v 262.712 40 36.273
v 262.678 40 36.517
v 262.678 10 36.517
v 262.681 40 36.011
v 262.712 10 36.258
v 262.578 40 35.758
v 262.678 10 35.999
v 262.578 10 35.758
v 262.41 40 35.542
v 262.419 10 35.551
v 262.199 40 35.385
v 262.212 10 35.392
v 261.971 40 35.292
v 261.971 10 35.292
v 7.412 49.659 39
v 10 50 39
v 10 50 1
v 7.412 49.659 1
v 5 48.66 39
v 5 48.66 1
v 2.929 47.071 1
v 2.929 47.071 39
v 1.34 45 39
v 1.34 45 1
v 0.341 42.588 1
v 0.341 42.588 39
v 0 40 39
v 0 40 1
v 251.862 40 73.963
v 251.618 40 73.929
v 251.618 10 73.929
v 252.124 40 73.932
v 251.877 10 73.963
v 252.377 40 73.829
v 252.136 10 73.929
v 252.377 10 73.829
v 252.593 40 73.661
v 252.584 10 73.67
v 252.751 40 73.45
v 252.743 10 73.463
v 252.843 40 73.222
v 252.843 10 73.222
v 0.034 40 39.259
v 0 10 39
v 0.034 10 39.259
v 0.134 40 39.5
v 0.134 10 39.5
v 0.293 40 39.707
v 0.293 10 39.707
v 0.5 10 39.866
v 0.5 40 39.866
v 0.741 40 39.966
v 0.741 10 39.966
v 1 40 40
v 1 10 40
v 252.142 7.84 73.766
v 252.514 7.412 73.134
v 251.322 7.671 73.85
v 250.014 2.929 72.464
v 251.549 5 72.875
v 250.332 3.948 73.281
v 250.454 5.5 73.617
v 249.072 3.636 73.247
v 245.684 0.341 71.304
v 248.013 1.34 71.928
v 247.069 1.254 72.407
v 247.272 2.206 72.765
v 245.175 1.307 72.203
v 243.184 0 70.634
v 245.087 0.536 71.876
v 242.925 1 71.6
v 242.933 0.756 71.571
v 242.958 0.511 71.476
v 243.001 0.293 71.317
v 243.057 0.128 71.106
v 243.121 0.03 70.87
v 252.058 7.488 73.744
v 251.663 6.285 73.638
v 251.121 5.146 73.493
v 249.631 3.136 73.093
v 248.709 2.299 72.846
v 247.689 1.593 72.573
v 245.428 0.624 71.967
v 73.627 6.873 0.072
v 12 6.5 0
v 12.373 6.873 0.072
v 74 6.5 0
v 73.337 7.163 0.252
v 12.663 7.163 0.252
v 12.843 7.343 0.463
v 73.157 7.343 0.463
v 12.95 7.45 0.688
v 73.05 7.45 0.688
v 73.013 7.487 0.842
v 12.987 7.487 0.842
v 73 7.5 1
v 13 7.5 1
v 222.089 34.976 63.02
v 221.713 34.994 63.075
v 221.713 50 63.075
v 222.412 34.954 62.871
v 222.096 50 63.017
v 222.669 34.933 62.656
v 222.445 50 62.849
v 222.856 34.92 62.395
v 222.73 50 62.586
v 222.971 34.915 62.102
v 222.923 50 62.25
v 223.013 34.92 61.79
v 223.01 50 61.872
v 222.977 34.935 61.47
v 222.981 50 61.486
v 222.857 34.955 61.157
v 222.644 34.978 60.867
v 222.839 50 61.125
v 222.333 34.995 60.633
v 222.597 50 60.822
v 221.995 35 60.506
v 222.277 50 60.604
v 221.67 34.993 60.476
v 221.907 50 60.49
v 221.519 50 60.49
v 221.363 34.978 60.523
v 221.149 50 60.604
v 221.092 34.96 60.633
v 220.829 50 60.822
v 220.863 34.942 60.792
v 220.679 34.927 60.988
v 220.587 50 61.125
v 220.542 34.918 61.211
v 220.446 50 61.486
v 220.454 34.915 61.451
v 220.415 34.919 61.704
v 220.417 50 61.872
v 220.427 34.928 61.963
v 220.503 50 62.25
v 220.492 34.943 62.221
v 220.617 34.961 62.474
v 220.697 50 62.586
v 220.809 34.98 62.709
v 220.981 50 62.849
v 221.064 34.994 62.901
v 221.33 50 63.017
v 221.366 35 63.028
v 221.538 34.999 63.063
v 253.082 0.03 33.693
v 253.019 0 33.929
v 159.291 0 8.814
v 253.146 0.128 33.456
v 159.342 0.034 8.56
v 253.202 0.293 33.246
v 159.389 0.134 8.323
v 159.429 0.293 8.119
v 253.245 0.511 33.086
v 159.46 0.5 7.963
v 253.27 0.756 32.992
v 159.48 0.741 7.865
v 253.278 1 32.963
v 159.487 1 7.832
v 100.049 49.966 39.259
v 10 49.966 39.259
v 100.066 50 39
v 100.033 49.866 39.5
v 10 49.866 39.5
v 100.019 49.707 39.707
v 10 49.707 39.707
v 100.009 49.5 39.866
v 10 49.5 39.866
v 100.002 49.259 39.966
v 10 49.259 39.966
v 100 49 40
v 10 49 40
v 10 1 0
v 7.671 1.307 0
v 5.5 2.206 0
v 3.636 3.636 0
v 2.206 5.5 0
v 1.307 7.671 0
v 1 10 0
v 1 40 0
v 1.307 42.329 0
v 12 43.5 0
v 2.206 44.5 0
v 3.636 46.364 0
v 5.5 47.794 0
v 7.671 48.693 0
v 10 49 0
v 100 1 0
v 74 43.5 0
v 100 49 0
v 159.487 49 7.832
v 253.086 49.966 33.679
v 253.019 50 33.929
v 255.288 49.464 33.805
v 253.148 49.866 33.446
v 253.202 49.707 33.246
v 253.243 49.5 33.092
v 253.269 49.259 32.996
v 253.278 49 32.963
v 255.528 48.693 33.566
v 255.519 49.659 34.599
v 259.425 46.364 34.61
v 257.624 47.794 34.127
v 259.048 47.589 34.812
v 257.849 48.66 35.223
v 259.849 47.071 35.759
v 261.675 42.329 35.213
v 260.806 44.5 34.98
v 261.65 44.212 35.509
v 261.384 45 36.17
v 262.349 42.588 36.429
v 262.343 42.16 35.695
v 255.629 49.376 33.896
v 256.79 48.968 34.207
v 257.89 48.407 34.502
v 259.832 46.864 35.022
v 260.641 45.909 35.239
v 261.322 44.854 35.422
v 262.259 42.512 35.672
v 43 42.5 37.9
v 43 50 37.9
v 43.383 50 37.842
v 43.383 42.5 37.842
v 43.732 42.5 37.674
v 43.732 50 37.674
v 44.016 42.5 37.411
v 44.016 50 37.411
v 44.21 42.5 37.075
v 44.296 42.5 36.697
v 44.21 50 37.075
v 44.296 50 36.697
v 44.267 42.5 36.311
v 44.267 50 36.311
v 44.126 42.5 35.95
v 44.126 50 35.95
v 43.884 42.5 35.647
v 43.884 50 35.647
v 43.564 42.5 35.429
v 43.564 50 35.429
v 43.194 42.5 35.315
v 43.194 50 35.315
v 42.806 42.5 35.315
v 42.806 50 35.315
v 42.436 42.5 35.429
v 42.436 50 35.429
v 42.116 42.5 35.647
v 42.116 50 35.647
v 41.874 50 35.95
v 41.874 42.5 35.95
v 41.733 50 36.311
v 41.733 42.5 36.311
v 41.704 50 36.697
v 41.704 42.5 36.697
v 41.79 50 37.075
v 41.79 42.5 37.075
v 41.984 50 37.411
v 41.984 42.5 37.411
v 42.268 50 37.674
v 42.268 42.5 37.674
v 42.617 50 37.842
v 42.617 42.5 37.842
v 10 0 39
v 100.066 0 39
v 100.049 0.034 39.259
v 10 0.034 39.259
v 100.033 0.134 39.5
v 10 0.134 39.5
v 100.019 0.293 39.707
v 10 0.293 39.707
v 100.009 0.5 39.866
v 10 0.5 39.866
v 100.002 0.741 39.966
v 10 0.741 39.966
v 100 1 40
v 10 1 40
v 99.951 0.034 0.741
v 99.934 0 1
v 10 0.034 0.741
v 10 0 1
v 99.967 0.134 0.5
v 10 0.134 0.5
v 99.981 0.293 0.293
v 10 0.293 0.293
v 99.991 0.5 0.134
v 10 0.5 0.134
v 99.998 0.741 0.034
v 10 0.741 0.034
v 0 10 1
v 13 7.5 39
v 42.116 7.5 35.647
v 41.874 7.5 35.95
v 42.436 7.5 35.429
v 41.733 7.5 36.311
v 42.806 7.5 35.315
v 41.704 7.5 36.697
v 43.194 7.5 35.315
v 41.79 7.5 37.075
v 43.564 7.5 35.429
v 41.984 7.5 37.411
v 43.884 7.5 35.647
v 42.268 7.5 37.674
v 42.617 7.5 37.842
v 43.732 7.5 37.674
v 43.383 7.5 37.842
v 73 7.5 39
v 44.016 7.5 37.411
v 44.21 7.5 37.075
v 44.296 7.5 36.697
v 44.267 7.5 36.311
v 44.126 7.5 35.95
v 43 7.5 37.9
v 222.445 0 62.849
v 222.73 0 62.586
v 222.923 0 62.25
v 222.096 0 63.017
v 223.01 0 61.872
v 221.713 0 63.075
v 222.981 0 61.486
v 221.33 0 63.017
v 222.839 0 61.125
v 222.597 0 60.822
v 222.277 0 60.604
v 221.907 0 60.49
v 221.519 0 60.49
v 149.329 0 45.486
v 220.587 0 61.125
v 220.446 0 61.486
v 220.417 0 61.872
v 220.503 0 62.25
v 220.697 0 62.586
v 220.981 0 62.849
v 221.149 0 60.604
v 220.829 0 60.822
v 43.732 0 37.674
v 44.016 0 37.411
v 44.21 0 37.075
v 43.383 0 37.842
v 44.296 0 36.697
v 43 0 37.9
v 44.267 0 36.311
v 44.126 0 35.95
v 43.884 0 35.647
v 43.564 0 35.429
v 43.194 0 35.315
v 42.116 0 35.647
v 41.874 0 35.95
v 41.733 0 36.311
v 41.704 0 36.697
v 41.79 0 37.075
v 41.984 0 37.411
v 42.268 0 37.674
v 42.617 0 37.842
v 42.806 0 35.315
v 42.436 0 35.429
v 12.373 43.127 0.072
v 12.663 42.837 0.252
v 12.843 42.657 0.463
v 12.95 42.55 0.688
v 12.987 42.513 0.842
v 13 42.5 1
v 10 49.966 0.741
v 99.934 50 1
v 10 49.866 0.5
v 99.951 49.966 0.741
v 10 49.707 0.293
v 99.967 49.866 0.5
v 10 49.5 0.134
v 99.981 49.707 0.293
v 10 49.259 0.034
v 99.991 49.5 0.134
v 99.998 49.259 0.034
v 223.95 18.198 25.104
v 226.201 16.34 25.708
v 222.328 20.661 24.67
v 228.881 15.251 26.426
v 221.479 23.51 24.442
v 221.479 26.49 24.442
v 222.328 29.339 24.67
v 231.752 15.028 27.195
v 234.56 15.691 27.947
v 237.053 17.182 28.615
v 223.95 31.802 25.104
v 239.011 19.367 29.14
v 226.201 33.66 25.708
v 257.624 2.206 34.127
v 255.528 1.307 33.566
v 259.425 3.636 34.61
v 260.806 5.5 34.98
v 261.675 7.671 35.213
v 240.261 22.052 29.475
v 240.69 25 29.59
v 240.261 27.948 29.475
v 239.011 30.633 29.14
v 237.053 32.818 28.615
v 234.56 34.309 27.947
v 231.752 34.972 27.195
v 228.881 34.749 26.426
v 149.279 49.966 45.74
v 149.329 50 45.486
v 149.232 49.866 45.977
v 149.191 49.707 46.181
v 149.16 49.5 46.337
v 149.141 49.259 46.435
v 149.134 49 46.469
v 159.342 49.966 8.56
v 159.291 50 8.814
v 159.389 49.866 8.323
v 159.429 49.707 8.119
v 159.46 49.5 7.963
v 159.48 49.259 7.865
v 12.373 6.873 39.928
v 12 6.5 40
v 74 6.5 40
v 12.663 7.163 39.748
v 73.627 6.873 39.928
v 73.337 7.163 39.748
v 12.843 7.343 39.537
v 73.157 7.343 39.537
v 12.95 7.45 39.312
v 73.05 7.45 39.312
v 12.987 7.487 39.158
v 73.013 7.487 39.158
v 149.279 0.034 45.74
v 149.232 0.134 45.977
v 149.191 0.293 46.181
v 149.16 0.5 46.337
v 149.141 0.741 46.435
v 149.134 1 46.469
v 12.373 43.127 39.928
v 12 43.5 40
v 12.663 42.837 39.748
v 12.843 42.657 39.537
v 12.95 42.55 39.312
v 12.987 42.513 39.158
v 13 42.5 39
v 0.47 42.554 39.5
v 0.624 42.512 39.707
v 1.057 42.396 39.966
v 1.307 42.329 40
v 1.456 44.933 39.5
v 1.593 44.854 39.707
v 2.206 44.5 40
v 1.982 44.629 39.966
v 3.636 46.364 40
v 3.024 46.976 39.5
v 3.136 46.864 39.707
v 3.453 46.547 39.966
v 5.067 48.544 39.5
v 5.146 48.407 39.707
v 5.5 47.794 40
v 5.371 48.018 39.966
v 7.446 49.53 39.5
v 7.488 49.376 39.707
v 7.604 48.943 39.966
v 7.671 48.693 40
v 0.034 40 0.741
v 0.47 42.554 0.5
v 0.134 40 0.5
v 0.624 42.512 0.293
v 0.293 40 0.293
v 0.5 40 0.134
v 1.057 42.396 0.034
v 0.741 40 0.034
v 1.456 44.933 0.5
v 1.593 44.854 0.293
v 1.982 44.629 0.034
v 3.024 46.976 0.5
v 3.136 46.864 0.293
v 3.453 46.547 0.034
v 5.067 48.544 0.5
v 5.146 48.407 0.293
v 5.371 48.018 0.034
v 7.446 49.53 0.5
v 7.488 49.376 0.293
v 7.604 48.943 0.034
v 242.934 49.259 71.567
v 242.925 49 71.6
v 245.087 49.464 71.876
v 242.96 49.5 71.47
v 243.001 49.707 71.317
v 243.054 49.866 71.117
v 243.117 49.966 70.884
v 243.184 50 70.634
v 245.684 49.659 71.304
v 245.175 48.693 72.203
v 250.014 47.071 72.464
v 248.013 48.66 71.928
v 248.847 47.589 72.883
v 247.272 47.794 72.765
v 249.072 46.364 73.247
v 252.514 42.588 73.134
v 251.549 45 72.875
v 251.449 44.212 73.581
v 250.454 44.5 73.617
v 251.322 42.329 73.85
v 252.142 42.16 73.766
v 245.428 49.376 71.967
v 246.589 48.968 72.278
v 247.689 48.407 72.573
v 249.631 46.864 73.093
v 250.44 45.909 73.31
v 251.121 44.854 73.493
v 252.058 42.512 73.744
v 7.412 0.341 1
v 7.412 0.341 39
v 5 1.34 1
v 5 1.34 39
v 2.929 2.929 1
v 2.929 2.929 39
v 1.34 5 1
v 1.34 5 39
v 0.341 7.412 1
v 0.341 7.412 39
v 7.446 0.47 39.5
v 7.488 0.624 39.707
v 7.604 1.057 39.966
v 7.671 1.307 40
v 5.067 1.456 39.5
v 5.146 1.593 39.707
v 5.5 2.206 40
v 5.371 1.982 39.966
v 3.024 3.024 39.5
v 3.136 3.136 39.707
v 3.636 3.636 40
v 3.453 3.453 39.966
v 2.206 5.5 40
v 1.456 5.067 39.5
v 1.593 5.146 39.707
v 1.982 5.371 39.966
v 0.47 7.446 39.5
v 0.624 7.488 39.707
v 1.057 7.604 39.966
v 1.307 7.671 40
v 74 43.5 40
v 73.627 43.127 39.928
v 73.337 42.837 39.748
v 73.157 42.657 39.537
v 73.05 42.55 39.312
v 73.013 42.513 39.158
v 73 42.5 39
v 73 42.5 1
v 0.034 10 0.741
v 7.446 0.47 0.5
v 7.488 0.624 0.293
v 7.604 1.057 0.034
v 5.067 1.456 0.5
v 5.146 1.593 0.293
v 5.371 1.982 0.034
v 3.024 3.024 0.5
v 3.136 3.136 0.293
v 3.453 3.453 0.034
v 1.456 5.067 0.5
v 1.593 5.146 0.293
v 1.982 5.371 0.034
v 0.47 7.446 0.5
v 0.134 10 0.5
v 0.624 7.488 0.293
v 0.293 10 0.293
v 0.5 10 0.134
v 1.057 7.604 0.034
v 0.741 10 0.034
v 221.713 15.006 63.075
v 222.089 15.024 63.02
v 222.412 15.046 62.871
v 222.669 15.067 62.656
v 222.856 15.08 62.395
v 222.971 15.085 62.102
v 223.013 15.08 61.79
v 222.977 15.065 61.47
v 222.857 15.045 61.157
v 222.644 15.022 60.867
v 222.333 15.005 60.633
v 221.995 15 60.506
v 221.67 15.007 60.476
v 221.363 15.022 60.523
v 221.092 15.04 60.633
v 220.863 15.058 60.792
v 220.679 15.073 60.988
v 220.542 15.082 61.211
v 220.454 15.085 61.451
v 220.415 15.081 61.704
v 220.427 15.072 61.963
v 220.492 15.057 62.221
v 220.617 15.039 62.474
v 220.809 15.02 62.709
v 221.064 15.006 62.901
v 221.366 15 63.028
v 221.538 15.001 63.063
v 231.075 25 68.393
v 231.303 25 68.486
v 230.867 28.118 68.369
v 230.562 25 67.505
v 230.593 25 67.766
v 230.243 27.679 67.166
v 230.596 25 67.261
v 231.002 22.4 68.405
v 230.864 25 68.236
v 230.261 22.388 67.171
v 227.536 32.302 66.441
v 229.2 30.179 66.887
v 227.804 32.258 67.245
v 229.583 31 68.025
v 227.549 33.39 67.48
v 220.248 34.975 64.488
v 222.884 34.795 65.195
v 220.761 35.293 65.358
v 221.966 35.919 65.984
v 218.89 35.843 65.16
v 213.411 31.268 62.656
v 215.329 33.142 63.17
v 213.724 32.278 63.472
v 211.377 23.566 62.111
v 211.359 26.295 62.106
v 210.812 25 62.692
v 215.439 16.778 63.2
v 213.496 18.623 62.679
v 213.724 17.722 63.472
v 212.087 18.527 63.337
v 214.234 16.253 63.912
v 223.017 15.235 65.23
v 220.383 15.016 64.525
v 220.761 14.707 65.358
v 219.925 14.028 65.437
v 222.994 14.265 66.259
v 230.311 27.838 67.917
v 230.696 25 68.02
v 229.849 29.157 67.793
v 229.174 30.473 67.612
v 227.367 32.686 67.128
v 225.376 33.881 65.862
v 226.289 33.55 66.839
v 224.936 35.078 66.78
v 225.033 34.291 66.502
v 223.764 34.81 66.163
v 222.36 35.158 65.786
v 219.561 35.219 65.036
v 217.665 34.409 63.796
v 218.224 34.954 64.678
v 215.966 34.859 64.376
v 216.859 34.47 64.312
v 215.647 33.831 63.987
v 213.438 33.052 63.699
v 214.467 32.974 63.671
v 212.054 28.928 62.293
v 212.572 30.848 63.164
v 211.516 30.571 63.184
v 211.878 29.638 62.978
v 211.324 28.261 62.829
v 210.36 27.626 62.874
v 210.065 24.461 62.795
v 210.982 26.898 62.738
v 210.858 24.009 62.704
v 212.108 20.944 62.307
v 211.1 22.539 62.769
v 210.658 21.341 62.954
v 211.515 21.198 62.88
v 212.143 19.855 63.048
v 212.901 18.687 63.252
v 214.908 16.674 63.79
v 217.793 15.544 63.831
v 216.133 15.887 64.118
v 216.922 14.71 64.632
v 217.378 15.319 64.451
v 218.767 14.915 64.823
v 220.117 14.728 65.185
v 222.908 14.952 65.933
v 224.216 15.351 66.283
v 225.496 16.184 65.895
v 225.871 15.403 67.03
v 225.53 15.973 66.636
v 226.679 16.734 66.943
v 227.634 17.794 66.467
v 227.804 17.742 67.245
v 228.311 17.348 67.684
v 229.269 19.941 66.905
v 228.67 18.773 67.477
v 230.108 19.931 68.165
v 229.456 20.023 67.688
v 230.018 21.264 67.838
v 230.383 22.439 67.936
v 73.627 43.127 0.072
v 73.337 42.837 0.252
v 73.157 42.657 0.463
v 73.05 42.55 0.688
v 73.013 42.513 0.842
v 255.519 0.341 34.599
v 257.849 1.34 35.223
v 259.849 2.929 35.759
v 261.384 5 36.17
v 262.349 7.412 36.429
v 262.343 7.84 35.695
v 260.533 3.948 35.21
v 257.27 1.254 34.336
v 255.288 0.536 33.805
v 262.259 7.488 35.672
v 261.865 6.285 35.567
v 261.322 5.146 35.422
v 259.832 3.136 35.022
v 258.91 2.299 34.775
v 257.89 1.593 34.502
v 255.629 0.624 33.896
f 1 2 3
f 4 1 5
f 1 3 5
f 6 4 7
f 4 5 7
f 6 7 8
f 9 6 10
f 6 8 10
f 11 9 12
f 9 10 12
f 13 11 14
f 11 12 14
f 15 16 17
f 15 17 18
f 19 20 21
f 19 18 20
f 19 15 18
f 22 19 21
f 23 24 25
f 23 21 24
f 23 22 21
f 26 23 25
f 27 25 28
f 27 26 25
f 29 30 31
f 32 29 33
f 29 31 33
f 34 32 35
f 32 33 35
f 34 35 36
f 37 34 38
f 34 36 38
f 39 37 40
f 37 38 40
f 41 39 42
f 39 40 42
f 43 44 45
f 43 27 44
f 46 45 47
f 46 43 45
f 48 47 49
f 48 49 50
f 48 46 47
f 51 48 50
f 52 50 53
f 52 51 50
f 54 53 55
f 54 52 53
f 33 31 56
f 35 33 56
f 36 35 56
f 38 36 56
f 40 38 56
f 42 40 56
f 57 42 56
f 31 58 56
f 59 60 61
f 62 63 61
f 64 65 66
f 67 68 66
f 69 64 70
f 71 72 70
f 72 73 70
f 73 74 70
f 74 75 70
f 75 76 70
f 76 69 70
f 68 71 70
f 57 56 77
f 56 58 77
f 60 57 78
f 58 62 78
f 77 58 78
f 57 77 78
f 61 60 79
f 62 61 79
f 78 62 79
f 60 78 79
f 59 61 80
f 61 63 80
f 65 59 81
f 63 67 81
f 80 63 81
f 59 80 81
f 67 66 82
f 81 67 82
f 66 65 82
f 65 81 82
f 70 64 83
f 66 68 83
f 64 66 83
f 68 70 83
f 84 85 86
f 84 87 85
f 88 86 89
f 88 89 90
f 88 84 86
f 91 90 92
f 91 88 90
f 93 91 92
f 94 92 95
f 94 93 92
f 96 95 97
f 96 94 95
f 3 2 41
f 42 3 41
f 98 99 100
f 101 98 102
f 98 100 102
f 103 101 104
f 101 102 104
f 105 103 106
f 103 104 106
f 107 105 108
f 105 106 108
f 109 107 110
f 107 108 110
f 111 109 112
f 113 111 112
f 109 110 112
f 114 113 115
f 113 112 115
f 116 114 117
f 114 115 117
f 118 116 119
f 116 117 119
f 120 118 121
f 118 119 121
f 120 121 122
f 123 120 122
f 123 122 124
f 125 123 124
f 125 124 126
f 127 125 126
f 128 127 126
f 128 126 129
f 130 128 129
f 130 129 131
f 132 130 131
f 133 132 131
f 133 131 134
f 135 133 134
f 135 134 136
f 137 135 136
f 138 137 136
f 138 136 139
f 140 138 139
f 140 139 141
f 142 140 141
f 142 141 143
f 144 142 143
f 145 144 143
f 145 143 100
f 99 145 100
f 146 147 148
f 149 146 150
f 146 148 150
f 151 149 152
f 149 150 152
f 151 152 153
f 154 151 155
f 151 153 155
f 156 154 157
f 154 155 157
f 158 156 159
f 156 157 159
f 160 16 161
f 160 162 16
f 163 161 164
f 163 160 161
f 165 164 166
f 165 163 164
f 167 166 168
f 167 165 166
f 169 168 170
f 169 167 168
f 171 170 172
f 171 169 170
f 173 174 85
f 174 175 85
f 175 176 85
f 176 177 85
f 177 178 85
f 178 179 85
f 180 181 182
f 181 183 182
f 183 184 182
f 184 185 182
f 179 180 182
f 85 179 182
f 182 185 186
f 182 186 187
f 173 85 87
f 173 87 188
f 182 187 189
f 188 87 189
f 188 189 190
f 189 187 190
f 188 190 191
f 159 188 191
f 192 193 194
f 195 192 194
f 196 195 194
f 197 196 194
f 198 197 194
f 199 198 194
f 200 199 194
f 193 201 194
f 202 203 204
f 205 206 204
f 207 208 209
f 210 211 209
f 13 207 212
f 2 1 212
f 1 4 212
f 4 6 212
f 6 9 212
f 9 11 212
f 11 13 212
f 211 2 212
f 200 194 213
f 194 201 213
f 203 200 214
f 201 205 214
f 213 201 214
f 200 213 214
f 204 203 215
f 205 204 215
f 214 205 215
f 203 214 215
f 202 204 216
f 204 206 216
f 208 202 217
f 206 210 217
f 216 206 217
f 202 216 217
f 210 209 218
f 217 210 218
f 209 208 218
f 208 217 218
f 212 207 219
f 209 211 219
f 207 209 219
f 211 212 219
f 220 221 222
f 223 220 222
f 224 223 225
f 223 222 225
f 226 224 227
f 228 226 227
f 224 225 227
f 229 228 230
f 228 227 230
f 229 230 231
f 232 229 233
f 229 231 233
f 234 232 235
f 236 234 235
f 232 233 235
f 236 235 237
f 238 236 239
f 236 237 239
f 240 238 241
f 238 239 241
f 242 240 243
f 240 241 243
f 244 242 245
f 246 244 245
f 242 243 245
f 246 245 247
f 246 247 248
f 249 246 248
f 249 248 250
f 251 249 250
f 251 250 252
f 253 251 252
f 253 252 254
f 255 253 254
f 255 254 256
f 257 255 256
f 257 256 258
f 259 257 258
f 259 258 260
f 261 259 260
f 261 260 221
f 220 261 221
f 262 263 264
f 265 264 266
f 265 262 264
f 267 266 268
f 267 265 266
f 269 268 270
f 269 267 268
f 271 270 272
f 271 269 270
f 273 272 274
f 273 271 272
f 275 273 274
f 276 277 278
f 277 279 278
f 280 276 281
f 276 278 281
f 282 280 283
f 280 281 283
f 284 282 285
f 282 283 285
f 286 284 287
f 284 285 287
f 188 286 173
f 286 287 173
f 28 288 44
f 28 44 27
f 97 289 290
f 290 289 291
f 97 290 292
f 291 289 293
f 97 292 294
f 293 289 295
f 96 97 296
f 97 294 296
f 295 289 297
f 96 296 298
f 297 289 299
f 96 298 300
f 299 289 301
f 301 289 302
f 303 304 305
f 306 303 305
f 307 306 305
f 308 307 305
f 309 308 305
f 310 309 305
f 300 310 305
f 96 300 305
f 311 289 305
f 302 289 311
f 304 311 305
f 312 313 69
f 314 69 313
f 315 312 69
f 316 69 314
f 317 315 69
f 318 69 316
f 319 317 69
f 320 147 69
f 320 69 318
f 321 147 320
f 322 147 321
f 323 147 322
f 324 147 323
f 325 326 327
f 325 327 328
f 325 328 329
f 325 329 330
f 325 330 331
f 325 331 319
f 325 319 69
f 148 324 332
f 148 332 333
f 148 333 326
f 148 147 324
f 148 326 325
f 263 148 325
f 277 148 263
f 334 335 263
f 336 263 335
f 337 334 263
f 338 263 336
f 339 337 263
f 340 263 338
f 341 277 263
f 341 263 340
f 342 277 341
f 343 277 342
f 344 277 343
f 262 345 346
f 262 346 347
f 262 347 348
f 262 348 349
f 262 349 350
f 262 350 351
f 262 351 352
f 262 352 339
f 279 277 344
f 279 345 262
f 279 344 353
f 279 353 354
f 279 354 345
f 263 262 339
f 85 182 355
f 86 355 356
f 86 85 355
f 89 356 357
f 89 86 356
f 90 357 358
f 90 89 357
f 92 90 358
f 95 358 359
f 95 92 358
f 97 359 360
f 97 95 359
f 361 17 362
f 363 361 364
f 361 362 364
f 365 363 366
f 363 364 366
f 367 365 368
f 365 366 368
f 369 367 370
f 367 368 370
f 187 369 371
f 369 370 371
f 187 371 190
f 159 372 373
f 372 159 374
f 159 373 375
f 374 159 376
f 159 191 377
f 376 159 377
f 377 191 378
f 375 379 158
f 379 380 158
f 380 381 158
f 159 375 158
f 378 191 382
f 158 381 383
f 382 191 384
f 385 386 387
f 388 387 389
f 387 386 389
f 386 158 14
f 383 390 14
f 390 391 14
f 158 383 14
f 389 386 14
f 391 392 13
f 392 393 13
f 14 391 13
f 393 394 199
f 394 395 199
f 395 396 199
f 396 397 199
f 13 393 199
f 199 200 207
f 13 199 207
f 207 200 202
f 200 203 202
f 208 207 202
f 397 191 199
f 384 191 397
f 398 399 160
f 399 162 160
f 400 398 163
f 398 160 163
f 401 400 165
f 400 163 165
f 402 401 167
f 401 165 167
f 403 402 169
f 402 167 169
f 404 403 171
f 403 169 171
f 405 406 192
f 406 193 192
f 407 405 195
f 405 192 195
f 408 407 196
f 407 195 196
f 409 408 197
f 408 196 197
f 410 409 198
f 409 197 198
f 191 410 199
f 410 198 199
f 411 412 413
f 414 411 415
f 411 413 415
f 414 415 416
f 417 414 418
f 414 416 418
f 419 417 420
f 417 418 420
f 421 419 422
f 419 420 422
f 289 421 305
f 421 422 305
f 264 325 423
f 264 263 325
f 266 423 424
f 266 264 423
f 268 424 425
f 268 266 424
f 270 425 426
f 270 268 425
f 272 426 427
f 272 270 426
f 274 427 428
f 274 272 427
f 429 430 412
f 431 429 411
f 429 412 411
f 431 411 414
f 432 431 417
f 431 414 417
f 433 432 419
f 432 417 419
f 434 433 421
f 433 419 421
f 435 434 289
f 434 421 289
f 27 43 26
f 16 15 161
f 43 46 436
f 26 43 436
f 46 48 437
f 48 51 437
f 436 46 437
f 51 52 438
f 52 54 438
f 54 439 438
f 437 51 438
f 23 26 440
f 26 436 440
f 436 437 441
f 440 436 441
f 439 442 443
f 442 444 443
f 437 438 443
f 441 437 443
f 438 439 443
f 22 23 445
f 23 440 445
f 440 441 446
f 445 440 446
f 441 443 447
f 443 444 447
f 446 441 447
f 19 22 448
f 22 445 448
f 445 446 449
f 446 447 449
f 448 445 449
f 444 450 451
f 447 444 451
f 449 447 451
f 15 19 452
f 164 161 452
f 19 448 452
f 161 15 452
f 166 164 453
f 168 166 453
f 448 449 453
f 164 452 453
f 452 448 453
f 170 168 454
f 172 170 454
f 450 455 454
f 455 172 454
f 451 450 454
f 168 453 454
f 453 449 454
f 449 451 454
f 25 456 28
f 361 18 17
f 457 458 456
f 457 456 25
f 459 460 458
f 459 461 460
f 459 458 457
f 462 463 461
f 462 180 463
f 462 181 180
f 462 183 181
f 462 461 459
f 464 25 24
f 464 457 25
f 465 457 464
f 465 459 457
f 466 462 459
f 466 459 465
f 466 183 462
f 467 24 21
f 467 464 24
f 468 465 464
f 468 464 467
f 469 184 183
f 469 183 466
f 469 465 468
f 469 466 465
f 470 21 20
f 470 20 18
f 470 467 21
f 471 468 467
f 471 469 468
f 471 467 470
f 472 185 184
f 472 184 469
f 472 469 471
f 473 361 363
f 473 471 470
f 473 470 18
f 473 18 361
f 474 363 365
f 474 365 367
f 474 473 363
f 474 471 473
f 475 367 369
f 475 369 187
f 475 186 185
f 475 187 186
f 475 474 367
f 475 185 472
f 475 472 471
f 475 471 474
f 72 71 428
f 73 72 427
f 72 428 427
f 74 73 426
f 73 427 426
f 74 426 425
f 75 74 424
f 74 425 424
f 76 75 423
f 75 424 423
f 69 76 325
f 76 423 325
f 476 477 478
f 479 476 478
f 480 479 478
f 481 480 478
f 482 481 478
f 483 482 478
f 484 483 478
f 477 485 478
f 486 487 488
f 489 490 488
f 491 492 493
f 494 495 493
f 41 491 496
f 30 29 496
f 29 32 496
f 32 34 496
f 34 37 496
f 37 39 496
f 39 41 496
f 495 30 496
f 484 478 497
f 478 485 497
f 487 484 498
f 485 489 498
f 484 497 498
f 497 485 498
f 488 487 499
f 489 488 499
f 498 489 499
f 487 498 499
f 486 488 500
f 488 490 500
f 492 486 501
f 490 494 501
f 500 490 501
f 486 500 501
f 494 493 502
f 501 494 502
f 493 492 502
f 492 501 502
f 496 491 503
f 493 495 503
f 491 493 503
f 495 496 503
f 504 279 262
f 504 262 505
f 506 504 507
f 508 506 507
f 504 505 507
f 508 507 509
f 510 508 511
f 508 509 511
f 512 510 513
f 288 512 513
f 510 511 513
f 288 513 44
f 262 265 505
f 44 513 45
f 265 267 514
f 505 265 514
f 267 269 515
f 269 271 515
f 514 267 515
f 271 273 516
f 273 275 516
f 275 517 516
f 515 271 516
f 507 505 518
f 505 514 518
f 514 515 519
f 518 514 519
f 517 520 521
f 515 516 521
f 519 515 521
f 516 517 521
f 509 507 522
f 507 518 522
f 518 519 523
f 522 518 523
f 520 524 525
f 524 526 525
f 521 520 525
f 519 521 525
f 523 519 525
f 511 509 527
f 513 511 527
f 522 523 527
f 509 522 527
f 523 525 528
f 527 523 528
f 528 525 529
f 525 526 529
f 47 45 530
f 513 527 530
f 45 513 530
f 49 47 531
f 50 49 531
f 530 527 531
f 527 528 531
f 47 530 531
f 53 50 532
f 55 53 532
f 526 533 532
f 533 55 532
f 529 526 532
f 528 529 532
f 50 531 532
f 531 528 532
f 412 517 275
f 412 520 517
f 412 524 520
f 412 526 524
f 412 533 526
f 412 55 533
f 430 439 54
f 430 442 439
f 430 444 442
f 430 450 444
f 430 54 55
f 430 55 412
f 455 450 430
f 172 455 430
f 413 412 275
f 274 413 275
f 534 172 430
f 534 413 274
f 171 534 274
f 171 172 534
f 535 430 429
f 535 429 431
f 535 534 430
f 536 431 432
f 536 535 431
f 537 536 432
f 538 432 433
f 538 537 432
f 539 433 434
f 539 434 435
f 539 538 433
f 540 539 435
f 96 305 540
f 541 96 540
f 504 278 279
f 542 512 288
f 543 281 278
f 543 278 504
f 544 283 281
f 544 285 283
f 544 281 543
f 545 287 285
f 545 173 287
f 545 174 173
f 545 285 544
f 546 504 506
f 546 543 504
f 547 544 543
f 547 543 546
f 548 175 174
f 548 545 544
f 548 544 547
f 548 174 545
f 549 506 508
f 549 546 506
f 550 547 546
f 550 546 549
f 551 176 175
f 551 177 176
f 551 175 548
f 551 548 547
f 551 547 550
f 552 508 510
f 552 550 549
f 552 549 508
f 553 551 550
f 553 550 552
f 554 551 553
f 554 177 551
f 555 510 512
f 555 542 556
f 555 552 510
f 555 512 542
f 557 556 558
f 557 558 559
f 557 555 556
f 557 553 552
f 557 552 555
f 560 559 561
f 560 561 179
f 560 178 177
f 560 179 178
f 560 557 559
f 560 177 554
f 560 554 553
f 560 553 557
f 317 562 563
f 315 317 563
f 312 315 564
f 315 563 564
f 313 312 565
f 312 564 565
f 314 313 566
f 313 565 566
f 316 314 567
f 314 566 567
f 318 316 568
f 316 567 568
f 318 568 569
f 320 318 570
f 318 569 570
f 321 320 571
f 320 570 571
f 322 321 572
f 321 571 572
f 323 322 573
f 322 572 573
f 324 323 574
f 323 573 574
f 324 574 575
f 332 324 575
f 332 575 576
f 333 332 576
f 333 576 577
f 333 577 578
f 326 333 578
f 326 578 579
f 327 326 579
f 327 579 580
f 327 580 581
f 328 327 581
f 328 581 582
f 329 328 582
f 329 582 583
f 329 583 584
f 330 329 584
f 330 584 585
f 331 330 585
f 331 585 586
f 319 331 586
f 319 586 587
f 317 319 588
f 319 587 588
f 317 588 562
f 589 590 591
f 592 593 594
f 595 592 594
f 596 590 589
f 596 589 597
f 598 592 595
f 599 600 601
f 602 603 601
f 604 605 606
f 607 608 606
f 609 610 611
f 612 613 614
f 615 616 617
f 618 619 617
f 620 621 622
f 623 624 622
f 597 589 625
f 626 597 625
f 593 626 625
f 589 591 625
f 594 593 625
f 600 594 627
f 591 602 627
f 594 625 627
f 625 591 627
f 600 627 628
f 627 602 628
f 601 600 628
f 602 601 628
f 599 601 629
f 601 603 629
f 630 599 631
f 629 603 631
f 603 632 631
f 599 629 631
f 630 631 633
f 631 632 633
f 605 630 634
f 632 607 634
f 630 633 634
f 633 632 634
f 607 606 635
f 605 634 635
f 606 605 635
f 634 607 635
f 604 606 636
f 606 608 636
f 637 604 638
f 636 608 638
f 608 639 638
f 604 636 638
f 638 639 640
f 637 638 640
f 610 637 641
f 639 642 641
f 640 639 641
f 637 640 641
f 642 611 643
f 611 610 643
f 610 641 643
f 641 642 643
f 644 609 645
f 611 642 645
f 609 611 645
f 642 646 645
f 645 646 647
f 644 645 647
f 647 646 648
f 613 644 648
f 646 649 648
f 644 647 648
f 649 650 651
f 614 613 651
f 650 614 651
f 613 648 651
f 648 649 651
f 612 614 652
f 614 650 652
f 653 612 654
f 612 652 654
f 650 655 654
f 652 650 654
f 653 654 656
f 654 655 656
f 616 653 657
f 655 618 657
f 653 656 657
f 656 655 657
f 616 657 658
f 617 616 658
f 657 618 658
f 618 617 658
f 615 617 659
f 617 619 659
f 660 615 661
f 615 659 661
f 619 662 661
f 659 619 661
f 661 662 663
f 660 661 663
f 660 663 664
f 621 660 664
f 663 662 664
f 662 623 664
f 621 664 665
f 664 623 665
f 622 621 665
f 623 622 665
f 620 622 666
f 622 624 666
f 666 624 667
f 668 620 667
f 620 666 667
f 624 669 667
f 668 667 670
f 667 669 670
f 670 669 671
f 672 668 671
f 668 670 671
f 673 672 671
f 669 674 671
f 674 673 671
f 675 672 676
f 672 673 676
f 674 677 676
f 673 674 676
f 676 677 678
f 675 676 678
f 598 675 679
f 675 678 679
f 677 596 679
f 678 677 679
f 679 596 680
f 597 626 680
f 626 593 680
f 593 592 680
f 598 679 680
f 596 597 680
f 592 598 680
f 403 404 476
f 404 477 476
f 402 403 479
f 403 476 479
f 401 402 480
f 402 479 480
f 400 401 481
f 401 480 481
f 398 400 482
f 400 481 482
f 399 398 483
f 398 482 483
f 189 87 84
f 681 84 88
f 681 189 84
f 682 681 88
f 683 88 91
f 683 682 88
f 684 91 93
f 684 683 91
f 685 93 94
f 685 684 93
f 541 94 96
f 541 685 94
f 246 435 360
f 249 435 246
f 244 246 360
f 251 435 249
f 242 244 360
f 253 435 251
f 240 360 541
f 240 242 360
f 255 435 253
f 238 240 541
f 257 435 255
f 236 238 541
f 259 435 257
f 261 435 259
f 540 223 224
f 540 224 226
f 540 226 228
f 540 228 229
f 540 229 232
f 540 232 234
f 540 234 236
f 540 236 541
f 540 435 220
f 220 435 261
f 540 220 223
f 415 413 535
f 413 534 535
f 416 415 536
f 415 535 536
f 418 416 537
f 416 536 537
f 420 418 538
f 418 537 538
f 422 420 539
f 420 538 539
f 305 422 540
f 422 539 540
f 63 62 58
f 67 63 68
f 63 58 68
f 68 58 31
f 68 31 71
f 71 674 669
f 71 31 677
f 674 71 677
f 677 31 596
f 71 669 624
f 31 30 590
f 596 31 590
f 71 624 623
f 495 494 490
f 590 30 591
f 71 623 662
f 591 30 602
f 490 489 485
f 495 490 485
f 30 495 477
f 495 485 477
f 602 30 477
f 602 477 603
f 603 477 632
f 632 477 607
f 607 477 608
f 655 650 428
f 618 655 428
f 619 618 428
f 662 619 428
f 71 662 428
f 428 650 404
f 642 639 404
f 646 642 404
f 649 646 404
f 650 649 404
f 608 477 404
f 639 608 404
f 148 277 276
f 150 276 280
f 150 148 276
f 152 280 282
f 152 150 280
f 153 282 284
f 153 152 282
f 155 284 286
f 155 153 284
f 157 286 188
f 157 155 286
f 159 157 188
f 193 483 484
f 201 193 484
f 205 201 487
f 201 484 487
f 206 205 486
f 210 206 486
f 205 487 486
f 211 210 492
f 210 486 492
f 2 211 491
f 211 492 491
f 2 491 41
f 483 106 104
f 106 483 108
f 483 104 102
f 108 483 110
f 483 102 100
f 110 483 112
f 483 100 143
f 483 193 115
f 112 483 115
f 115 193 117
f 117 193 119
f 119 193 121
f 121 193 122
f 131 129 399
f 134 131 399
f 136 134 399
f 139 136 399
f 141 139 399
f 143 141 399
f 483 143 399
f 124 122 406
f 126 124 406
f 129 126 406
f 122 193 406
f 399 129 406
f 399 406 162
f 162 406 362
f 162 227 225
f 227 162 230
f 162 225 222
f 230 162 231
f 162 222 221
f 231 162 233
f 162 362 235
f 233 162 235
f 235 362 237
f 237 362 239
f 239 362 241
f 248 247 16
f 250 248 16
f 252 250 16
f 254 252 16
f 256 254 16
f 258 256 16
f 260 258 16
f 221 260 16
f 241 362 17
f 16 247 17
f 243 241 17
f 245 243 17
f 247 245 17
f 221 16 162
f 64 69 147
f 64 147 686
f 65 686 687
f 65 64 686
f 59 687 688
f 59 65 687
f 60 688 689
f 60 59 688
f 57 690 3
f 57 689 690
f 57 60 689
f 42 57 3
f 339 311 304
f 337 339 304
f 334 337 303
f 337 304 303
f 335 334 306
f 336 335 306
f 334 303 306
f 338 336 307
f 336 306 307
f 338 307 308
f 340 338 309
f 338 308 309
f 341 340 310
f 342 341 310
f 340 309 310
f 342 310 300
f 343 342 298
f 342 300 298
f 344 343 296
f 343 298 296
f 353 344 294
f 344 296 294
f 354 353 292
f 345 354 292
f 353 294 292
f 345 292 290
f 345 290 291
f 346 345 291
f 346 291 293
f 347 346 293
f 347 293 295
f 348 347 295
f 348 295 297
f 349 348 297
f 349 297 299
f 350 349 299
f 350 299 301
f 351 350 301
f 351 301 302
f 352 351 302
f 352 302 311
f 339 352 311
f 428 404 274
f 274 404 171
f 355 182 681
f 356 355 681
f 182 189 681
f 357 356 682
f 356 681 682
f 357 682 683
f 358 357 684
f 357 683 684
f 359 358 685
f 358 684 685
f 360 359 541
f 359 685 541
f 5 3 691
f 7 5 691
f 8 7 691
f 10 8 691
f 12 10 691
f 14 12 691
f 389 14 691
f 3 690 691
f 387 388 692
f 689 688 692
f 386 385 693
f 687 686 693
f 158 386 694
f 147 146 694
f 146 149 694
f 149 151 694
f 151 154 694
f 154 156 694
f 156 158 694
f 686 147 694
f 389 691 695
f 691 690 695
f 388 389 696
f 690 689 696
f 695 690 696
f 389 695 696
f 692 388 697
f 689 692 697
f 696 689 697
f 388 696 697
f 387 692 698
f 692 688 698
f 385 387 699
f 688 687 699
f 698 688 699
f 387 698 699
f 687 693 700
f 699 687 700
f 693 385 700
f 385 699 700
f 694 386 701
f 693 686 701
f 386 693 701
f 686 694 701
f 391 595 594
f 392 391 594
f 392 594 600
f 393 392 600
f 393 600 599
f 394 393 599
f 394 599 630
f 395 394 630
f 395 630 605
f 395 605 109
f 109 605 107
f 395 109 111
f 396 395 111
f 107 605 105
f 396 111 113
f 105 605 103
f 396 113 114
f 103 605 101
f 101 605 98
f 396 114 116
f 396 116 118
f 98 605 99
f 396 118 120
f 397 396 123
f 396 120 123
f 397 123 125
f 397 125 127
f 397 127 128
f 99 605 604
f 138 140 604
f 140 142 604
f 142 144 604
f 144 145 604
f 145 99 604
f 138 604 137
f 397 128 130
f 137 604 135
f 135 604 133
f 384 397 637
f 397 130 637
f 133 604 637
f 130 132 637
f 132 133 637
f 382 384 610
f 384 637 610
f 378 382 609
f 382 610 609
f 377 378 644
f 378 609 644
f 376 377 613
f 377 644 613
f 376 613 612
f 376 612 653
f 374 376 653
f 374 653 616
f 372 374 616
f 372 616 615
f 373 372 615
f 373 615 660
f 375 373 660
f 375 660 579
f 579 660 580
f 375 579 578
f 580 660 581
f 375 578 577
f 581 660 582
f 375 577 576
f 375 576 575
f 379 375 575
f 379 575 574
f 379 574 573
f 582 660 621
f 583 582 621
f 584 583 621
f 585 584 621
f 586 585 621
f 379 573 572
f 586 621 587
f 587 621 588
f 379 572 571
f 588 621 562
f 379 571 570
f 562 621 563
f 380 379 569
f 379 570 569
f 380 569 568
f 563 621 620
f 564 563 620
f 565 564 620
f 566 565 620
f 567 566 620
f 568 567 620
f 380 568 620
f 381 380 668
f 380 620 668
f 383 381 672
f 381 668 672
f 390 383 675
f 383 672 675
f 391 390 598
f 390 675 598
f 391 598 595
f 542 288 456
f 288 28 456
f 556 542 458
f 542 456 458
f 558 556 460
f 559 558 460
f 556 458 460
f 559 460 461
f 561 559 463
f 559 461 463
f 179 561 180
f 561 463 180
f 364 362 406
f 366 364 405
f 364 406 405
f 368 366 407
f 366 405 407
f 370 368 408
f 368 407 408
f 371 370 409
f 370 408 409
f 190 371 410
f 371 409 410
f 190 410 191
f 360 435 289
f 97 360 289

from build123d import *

# Parameters (mm, degrees)
SKETCH_1_W          = 100
SKETCH_1_H          = 50
EXTRUDE_1_DEPTH     = 40
SKETCH_2_W          = 60
SKETCH_2_H          = 17.5
CUT_EXTRUDE_1_DEPTH = 70
SKETCH_4_R          = 1.3
CUT_EXTRUDE_2_DEPTH = 119.74342087
EXTRUDE_2_DEPTH     = 50
SKETCH_6_R          = 10
CUT_EXTRUDE_3_DEPTH = 278.729911697
SKETCH_7_R          = 1.3
CUT_EXTRUDE_4_DEPTH = 278.740409113
FILLET_1_R          = 10
FILLET_2_R          = 1


with BuildPart() as part:
    # 草圖1 → 填料-伸長1 (new body)
    with BuildSketch(Plane.XY):
        with Locations((50, 25)):
            Rectangle(SKETCH_1_W, SKETCH_1_H)
    extrude(amount=EXTRUDE_1_DEPTH)

    # 草圖2 → 除料-伸長1 (cut)
    with BuildSketch(Plane.XY.offset(40)):
        with Locations((43, 33.75)):
            Rectangle(SKETCH_2_W, SKETCH_2_H)
        with Locations((43, 16.25)):
            Rectangle(SKETCH_2_W, SKETCH_2_H)
    extrude(amount=-CUT_EXTRUDE_1_DEPTH, mode=Mode.SUBTRACT)

    # 草圖4 → 除料-伸長2 (cut, through all)
    with BuildSketch(Plane(origin=(0, 50, 0), x_dir=(1, 0, 0), z_dir=(0, 1, 0))):
        with Locations(Location((43, -36.6, 0), (0, 0, 270))):
            Circle(SKETCH_4_R)
    extrude(amount=-CUT_EXTRUDE_2_DEPTH, mode=Mode.SUBTRACT)

    # 草圖5 → 填料-伸長2 (add)
    with BuildSketch(Plane(origin=(0, 50, 0), x_dir=(1, 0, 0), z_dir=(0, 1, 0))):
        Polygon((149.133929878, -46.468604585), (100, -40), (100, 0), (159.486691682, -7.831571533), (262.937008695, -35.551000434), (252.584246891, -74.188033485), align=None)
    extrude(amount=-EXTRUDE_2_DEPTH)

    # 草圖6 → 除料-伸長3 (cut, through all)
    with BuildSketch(Plane(origin=(-1.627072127, 0, 6.072315847), x_dir=(0.9659258262890664, 0, 0.2588190451025279), z_dir=(-0.25881904510252796, 0, 0.9659258262890664))):
        with Locations((230.147023393, 25)):
            Circle(SKETCH_6_R)
    extrude(amount=-CUT_EXTRUDE_3_DEPTH, mode=Mode.SUBTRACT)

    # 草圖7 → 除料-伸長4 (cut, through all)
    with BuildSketch(Plane(origin=(0, 50, 0), x_dir=(1, 0, 0), z_dir=(0, 1, 0))):
        with Locations(Location((221.713157792, -61.77504537, 0), (0, 0, 270))):
            Circle(SKETCH_7_R)
    extrude(amount=-CUT_EXTRUDE_4_DEPTH, mode=Mode.SUBTRACT)

    # 圓角1
    fillet_1_edges = [part.edges().sort_by_distance(p)[0] for p in [
        (257.760627793, 0, 54.869516959),
        (257.760627793, 50, 54.869516959),
        (0, 50, 20),
        (0, 0, 20),
    ]]
    fillet(fillet_1_edges, radius=FILLET_1_R)

    # 圓角2
    fillet_2_edges = [part.edges().sort_by_distance(p)[0] for p in [
        (55, 50, 40),
        (43, 7.5, 0),
        (73, 25, 0),
        (43, 42.5, 0),
        (13, 25, 0),
        (43, 42.5, 40),
        (73, 25, 40),
        (13, 25, 40),
        (43, 7.5, 40),
        (196.029459253, 0, 59.034223809),
        (206.382221057, 50, 20.397190758),
        (129.743345841, 0, 3.915785767),
        (129.743345841, 50, 3.915785767),
        (124.566964939, 0, 43.234302292),
        (124.566964939, 50, 43.234302292),
        (55, 50, 0),
        (211.018623349, 25, 63.050558224),
        (252.584246891, 25, 74.188033485),
        (262.937008695, 25, 35.551000434),
        (196.029459253, 50, 59.034223809),
        (249.755115647, 2.928932188, 73.429970053),
        (249.755115647, 47.071067812, 73.429970053),
        (206.382221057, 0, 20.397190758),
        (260.107877451, 2.928932188, 34.792937001),
        (260.107877451, 47.071067812, 34.792937001),
        (55, 0, 0),
        (55, 0, 40),
        (0, 25, 0),
        (0, 25, 40),
        (2.928932188, 2.928932188, 0),
        (2.928932188, 47.071067812, 0),
        (2.928932188, 2.928932188, 40),
        (2.928932188, 47.071067812, 40),
    ]]
    fillet(fillet_2_edges, radius=FILLET_2_R)


solid = part.part
